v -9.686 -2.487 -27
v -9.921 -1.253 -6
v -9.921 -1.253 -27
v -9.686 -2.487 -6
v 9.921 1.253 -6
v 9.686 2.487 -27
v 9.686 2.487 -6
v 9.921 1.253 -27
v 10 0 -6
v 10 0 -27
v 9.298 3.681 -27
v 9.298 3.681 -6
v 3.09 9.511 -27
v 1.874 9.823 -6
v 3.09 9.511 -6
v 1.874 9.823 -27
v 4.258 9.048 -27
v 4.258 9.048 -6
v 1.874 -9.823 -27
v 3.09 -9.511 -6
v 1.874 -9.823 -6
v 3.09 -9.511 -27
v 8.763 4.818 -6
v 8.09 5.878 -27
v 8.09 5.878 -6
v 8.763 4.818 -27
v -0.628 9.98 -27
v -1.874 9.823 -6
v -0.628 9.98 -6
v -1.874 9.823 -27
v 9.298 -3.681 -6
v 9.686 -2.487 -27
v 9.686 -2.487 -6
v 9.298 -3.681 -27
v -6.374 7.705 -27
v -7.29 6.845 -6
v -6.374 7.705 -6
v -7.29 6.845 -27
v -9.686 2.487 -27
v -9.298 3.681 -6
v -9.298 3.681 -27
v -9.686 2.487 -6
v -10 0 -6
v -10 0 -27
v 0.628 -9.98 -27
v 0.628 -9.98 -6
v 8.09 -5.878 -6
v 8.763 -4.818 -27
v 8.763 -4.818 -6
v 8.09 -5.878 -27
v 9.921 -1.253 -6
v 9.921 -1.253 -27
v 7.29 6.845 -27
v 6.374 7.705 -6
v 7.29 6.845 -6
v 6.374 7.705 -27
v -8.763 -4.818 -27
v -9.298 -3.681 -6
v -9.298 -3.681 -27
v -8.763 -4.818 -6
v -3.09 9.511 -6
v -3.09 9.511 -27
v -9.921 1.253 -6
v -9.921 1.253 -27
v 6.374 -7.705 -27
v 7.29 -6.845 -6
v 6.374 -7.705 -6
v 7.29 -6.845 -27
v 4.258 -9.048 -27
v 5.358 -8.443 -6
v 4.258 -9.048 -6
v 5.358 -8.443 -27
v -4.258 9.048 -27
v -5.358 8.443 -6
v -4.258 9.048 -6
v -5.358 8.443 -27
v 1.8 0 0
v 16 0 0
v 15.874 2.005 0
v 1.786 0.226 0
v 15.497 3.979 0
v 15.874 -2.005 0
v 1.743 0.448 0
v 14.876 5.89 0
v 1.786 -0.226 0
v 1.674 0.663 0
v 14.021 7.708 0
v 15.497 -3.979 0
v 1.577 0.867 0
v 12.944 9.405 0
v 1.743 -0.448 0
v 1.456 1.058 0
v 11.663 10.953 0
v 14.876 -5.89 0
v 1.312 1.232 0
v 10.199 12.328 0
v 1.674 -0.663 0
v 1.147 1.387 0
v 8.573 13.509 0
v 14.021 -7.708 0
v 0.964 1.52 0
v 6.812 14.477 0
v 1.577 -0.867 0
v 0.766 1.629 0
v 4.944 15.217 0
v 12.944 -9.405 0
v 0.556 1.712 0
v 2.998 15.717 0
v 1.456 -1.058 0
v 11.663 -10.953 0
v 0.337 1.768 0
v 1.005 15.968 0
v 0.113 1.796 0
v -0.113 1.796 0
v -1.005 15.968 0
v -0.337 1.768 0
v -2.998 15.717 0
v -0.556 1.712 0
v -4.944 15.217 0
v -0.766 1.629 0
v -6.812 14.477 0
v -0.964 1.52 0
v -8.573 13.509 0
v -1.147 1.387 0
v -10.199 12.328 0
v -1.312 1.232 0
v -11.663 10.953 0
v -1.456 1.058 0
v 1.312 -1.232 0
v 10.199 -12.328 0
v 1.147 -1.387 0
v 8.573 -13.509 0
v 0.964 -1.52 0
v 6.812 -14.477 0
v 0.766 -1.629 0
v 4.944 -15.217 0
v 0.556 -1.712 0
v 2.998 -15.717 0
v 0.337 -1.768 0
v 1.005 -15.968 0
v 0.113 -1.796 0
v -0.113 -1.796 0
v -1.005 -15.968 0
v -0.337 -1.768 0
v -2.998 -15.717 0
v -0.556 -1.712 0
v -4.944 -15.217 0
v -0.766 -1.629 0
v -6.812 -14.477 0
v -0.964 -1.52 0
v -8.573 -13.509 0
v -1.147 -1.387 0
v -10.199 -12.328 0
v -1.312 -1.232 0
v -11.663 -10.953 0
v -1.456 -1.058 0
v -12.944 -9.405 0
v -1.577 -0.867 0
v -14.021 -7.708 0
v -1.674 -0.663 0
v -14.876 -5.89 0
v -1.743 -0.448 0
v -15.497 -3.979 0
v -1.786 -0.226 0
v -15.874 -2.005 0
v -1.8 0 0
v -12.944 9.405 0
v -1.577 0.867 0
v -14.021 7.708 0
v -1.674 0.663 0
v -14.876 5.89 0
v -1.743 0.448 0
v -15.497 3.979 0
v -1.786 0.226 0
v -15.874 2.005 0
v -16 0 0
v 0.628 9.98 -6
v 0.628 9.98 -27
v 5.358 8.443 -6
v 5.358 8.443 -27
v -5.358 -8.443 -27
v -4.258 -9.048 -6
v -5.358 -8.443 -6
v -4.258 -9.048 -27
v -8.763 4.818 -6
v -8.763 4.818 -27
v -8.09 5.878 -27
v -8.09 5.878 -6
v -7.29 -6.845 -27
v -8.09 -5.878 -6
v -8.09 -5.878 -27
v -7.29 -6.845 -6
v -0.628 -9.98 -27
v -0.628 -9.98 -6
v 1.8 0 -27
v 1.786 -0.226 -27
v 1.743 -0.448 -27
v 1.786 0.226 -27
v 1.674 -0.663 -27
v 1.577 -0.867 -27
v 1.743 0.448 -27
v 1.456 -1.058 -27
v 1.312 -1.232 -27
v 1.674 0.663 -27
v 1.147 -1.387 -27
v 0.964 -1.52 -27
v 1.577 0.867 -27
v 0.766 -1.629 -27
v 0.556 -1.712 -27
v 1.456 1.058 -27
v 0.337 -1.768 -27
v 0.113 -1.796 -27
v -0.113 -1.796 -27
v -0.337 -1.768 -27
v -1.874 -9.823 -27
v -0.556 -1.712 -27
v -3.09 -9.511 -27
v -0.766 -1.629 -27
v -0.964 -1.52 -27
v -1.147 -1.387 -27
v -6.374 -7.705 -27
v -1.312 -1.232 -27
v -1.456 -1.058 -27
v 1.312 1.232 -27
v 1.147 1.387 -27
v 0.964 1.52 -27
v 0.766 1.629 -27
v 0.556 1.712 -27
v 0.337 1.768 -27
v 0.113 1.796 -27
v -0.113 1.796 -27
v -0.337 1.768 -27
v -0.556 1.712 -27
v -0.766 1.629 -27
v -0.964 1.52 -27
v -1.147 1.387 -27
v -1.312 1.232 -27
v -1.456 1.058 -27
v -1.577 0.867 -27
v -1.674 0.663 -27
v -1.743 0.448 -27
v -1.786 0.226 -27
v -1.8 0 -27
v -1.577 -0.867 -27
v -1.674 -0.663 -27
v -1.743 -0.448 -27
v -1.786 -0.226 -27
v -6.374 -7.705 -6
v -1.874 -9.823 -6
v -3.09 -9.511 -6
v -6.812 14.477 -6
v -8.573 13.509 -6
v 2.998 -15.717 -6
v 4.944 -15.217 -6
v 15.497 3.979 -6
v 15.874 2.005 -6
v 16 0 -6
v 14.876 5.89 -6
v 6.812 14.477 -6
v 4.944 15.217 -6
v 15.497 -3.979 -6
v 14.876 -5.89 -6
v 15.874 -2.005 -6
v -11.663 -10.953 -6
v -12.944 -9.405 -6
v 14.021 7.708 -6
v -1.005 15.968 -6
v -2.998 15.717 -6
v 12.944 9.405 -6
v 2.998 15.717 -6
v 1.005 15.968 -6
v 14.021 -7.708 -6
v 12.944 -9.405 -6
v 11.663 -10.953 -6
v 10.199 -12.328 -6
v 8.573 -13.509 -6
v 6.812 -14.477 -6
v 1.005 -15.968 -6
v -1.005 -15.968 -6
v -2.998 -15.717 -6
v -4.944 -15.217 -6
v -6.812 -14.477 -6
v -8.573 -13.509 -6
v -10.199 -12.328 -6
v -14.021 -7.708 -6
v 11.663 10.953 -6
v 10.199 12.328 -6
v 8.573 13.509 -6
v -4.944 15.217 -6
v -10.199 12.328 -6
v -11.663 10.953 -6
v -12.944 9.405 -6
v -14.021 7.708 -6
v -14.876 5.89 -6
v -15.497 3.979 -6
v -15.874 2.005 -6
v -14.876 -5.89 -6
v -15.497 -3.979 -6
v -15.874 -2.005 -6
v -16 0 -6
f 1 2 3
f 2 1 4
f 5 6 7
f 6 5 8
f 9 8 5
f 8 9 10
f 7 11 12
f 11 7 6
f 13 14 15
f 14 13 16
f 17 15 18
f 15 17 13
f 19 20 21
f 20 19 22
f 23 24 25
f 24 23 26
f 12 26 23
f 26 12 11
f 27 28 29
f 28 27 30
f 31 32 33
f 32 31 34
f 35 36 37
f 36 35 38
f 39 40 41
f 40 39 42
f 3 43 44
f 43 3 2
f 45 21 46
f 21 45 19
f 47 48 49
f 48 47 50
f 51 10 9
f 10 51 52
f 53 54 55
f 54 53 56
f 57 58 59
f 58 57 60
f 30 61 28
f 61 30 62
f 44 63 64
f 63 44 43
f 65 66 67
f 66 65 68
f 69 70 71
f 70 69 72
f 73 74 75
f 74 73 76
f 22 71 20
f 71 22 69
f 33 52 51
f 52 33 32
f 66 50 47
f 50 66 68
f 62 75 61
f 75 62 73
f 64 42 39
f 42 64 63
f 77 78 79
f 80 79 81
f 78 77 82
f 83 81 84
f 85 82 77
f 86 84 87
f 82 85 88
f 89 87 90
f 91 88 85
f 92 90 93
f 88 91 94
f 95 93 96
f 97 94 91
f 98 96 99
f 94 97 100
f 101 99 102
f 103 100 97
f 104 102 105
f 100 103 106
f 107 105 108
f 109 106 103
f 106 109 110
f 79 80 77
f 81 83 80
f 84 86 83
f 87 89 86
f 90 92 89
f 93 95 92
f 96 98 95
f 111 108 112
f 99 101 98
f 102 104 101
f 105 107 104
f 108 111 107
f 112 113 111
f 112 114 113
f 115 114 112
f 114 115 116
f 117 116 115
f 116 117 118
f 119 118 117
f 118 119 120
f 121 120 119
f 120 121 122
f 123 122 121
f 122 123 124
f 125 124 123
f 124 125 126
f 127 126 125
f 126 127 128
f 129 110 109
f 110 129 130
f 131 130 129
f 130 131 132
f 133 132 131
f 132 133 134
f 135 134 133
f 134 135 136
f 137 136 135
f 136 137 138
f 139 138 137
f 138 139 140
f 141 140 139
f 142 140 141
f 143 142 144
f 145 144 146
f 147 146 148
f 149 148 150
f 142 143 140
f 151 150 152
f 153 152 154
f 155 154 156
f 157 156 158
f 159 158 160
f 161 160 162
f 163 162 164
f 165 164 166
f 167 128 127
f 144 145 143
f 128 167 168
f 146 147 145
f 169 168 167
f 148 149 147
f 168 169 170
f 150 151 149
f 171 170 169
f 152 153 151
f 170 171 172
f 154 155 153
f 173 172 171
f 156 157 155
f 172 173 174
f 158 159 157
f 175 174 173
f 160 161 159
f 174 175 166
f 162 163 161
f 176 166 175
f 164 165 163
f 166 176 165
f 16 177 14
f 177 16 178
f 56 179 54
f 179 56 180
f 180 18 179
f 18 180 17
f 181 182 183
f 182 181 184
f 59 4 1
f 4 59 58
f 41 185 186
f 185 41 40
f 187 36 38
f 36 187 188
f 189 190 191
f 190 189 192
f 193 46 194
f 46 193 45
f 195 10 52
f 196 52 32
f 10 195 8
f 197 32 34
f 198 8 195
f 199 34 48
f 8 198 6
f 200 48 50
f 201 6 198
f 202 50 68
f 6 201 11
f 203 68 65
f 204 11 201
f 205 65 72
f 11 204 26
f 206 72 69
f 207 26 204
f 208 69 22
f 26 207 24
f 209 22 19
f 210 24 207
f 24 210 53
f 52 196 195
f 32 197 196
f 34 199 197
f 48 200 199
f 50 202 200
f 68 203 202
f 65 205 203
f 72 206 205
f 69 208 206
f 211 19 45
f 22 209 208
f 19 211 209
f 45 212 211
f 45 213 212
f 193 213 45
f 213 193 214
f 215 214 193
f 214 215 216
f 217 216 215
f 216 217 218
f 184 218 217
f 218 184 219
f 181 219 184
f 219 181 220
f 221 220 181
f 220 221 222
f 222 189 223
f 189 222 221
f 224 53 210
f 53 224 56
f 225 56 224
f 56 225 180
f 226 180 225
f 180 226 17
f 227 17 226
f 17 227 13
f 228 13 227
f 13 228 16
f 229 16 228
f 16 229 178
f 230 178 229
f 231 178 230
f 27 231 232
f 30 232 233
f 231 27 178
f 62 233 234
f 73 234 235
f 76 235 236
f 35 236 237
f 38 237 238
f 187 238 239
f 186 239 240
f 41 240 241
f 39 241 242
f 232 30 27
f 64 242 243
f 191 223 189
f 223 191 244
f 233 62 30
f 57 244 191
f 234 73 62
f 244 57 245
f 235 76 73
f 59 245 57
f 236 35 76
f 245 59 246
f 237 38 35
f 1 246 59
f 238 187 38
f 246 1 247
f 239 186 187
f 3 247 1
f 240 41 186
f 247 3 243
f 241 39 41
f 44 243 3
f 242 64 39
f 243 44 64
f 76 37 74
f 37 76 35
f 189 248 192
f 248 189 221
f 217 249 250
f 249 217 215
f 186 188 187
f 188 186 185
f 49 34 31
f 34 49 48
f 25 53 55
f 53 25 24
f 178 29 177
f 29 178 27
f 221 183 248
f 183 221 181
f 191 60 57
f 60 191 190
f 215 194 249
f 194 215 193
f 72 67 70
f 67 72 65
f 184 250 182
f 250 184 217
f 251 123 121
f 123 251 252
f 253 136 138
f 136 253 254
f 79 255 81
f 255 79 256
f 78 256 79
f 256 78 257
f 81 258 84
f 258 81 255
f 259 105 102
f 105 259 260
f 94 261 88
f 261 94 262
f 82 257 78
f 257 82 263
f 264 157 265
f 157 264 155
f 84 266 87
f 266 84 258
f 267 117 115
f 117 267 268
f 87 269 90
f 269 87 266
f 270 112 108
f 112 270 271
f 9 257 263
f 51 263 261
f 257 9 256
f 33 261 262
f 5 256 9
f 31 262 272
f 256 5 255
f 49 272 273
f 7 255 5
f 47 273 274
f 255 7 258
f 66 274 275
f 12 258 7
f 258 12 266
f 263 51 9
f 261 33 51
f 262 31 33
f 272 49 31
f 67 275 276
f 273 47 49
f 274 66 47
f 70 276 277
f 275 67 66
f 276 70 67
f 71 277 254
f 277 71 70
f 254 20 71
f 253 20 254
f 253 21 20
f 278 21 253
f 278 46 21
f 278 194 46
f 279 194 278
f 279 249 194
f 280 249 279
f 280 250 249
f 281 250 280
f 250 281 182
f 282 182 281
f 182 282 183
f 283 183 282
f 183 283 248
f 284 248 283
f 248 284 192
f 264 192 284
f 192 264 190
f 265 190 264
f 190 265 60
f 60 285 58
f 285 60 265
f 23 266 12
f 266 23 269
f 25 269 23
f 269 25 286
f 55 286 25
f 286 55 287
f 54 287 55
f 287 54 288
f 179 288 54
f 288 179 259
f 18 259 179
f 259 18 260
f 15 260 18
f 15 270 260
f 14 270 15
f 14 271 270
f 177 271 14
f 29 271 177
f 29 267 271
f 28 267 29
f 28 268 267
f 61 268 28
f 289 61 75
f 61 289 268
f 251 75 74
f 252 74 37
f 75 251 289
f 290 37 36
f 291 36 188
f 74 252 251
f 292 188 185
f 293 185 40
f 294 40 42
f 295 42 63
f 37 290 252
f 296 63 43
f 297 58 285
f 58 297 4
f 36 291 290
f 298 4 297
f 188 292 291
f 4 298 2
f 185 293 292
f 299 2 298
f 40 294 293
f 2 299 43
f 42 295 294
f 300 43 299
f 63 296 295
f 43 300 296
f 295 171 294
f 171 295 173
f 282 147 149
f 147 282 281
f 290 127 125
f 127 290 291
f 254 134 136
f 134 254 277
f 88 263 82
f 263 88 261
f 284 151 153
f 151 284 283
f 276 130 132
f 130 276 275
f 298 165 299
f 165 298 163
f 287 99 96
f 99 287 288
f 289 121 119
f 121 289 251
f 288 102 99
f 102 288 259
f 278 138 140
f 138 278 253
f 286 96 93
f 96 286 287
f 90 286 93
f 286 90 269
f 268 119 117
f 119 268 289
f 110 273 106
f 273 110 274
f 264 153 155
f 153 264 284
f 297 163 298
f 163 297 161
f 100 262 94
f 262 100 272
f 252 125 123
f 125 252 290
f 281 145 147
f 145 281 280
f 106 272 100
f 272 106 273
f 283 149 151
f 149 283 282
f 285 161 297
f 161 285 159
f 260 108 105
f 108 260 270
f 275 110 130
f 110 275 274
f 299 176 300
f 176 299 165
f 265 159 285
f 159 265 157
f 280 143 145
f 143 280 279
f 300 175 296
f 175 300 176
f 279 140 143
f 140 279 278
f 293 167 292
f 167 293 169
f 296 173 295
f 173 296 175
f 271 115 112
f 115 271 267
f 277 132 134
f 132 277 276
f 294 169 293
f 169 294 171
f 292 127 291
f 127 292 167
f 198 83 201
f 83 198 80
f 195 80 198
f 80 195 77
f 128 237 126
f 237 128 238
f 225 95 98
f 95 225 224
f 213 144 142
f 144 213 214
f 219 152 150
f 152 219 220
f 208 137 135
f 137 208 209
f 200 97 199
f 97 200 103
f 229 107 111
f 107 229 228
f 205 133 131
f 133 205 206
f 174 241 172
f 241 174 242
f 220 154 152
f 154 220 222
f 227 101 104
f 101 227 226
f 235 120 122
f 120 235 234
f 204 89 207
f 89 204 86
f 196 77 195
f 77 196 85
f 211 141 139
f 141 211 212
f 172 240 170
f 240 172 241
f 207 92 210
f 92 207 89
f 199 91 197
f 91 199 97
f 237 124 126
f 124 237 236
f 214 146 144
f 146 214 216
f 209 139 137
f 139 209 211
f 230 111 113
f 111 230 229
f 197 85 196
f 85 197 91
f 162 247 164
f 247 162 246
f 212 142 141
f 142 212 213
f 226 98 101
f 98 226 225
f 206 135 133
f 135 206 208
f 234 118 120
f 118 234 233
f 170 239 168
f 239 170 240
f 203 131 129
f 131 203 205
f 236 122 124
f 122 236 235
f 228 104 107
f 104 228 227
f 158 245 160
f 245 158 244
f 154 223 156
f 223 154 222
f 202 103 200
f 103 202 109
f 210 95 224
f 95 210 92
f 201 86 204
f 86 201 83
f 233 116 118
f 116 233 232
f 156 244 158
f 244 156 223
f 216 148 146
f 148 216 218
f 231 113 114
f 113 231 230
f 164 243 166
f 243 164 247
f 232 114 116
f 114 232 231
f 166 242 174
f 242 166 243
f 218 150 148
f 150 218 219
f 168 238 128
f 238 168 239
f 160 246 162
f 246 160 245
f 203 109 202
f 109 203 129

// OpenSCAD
$fn = 50;


difference() {
	union() {
		translate(v = [0, 0, -27.0000000000]) {
			cylinder(h = 27, r = 10.0000000000);
		}
		translate(v = [0, 0, -6.0000000000]) {
			cylinder(h = 6, r = 16.0000000000);
		}
	}
	union() {
		#translate(v = [0, 0, -27]) {
			cylinder(h = 27, r = 1.8000000000);
		}
	}
}
